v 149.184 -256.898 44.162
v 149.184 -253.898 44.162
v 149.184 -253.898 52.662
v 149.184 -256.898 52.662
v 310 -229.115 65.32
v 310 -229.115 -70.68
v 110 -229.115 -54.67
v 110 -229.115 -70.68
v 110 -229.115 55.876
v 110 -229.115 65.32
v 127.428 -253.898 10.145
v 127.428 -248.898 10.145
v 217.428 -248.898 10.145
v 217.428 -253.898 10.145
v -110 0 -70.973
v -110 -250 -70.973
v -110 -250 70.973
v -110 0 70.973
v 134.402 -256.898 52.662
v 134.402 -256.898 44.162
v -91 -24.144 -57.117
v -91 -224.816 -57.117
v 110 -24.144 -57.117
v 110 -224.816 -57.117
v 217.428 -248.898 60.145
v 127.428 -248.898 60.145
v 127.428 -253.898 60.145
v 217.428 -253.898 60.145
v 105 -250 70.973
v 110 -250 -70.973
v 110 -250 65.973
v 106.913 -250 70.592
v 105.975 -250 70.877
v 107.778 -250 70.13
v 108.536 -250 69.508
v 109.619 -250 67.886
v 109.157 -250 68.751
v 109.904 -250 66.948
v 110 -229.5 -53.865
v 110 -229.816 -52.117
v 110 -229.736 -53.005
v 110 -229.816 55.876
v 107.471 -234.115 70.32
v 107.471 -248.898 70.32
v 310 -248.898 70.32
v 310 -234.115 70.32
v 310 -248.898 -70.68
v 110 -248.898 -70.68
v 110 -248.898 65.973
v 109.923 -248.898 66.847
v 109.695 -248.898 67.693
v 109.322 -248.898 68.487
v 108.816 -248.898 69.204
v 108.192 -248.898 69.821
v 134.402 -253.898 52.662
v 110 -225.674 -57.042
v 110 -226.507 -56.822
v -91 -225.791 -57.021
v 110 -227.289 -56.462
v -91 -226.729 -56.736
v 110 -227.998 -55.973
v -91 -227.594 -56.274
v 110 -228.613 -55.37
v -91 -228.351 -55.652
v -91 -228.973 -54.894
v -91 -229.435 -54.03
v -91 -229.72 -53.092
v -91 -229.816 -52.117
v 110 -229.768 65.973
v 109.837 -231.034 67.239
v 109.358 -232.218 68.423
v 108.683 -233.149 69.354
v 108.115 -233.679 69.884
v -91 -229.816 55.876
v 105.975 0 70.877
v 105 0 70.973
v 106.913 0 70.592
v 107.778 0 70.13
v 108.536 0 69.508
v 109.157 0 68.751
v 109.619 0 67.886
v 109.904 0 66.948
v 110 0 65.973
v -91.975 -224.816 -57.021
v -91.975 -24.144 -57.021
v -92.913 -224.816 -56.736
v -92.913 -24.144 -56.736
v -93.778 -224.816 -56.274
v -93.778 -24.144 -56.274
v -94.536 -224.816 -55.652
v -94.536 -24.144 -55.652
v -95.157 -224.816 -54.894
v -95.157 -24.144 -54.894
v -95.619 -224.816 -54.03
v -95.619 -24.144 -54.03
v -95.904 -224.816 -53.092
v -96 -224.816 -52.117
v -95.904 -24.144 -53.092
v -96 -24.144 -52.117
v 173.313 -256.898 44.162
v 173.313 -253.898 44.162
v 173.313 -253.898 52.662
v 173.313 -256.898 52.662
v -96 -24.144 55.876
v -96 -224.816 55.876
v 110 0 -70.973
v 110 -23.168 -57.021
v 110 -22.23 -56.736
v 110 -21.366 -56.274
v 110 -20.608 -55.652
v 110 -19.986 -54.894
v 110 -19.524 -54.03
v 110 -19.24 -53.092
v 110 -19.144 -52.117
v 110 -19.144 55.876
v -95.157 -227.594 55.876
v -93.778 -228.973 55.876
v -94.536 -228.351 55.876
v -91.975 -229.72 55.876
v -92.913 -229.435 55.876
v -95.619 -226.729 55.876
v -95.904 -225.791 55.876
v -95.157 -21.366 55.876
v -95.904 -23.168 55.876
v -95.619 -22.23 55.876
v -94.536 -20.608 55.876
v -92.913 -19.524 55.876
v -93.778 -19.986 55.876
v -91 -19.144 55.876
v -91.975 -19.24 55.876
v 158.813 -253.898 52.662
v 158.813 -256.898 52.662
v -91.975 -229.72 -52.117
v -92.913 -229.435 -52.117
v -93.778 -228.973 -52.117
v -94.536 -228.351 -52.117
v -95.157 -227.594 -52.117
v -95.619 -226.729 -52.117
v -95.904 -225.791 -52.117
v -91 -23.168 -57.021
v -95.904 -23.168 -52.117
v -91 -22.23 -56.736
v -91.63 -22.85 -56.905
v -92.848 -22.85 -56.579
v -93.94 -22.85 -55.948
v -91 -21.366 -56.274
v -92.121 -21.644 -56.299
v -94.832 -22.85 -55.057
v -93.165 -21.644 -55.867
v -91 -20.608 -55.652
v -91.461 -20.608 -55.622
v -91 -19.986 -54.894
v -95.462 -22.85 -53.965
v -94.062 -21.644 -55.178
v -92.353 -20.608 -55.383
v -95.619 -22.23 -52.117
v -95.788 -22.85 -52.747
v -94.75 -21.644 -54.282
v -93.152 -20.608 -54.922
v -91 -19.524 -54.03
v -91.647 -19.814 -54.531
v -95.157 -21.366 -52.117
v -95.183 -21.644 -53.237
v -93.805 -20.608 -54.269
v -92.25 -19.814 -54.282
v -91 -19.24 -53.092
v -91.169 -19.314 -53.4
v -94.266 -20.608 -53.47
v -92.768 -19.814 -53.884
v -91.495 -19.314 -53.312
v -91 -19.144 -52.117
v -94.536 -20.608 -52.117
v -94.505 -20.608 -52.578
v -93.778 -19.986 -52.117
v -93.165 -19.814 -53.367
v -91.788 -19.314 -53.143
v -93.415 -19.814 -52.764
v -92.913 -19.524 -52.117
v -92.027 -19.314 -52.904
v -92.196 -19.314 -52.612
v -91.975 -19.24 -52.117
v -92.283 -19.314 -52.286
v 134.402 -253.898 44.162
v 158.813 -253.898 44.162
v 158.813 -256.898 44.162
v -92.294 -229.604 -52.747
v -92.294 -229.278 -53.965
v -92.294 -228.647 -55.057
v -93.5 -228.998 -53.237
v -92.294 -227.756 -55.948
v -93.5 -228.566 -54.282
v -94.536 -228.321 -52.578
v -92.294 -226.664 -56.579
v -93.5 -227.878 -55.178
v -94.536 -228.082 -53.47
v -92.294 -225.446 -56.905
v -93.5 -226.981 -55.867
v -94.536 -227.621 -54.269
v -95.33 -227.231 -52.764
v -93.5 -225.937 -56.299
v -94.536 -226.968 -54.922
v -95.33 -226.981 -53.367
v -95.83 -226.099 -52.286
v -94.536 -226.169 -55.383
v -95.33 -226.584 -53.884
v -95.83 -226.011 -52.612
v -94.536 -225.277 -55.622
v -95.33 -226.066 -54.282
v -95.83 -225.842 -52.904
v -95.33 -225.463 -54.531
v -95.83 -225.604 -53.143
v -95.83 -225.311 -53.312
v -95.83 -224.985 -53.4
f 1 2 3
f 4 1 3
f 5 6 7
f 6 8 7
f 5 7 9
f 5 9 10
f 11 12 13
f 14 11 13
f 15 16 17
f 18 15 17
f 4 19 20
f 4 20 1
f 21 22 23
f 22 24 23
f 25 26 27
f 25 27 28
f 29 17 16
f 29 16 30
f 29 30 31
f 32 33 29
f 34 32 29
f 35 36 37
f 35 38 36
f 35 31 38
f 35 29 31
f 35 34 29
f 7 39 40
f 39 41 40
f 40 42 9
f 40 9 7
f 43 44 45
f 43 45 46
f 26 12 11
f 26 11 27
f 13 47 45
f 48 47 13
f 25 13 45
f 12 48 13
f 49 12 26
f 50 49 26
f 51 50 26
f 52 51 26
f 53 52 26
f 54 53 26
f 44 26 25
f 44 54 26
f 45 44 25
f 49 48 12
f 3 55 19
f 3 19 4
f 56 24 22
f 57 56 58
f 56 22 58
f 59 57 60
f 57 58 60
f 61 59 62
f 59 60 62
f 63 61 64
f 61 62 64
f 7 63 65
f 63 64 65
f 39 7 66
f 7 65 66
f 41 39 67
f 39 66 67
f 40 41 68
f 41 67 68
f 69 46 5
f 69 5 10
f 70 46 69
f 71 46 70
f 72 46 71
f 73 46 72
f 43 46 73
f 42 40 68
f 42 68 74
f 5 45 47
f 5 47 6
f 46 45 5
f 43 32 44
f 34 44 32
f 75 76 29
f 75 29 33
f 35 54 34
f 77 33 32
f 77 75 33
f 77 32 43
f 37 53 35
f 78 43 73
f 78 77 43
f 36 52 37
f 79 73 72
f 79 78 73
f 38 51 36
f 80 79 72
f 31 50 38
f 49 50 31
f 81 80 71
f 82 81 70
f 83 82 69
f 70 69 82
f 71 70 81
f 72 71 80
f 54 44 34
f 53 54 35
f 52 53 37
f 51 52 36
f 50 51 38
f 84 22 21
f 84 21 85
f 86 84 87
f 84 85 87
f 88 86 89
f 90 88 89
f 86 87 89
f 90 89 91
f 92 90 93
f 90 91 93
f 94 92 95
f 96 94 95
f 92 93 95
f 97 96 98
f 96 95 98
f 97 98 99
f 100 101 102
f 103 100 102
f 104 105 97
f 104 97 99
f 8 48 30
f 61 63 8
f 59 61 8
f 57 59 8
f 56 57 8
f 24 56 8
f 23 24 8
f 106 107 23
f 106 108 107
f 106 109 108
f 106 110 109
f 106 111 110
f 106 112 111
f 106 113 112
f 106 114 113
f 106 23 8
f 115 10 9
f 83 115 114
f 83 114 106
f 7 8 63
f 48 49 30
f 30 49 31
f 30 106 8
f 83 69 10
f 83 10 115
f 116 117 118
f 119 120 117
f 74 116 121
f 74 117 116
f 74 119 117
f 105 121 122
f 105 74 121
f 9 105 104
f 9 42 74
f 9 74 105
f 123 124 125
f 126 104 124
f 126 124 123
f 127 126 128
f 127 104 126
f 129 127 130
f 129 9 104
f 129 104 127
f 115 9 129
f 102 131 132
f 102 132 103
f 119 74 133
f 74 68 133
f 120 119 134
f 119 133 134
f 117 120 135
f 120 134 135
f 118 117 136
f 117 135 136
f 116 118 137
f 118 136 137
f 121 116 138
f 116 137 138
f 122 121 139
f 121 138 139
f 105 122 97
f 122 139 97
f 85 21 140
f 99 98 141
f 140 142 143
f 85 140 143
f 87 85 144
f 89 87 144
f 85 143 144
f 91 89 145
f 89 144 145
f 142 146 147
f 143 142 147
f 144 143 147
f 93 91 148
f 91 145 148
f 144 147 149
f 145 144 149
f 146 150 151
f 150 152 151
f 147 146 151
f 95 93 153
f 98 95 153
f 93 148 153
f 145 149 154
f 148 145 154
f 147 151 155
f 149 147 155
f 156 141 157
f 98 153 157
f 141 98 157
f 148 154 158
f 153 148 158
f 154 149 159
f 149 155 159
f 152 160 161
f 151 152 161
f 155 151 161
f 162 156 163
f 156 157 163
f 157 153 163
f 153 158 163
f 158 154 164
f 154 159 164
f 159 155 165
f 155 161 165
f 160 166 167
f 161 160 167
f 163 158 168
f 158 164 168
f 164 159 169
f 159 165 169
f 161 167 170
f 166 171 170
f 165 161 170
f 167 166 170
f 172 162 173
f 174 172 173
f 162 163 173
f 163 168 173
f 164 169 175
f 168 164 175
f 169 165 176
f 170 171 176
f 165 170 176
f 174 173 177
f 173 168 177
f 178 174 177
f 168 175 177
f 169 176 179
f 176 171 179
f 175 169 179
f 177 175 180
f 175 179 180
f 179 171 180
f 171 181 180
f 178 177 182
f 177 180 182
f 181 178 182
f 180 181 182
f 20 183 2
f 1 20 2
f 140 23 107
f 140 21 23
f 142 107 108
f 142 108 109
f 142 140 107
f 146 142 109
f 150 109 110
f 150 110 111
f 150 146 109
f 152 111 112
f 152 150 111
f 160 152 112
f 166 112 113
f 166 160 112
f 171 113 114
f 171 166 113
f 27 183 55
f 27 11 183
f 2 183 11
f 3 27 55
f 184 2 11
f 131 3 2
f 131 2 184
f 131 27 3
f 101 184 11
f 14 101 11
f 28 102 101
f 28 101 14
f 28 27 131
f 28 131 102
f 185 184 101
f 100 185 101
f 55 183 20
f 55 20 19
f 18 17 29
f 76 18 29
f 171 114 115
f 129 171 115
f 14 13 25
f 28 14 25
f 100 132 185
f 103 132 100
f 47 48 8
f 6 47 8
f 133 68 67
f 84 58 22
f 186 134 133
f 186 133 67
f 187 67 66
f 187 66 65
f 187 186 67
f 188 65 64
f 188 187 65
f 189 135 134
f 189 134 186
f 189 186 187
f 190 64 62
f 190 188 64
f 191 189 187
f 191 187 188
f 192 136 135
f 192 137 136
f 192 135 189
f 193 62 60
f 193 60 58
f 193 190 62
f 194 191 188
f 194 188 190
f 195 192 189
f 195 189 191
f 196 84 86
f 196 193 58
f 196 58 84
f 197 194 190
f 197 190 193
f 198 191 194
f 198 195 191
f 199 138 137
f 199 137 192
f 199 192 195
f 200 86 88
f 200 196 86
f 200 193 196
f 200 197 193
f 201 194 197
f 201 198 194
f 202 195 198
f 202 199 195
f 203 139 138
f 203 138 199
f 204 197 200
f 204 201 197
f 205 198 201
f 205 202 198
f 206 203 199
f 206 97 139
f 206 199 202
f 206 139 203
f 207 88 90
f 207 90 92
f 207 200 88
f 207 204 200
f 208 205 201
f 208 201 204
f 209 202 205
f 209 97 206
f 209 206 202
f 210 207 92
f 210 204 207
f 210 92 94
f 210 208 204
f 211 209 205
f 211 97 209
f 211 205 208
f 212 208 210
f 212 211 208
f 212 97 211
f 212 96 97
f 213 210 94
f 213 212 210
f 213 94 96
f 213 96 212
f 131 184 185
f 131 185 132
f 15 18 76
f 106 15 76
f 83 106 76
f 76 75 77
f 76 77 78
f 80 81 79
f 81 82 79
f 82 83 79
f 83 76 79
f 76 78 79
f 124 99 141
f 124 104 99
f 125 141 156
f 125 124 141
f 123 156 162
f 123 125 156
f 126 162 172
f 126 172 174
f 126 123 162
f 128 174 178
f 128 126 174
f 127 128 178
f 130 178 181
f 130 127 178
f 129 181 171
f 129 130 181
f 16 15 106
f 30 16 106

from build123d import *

# Parameters (mm, degrees)
F0_W         = 220
F0_H         = 141.9456327772
F1_DEPTH     = 250
F3_W         = 210.672037676
F3_H         = 112.9930540919
F4_DEPTH     = 206
F5_W         = 19.7831674727
F5_H         = 141
F6_DEPTH     = 200
F7_T4_DEPTH  = 275
F7_T10_DEPTH = 275
F7_T16_DEPTH = 275
F7_T23_DEPTH = 275
F7_T29_DEPTH = 275
F8_SIZE      = 5
F9_T1_DEPTH  = 218.5
F10_R        = 5
F11_R        = 5
F12_W        = 90
F12_H        = 50
F13_DEPTH    = 5
F14_W        = 14.7826219899
F14_H        = 8.5
F15_DEPTH    = 3
F16_W        = 14.5
F16_H        = 8.5
F17_DEPTH    = 3


# Not quite as in the source:
# - a fillet or chamfer that OpenCascade refuses, or shapes differently, is made with other operations: its cross-section is extruded or revolved along the edge and cut away or added


with BuildPart() as f1:
    # F0 (on Front) → F1 (new body)
    with BuildSketch(Plane.XZ):
        Rectangle(F0_W, F0_H)
    extrude(amount=F1_DEPTH)

    # F3 (on face) → F4 (cut)
    with BuildSketch(Plane.YZ.offset(110)):
        with Locations((-124.4797622785, -0.6201006472)):
            Rectangle(F3_W, F3_H)
    extrude(amount=-F4_DEPTH, mode=Mode.SUBTRACT)

    # F5 (on face) → F6 (join)
    with BuildSketch(Plane.YZ.offset(110)):
        with Locations((-239.0063405037, -0.1803636551)):
            Rectangle(F5_W, F5_H)
    extrude(amount=F6_DEPTH)

    # F7: fillet of radius 5 on 1 edges, made by hand


with BuildPart() as f7_tool2:
    # F7_s3 → F7_t4 (new body)
    with BuildSketch(Plane.XZ.offset(-12.5)):
        with BuildLine():
            ThreePointArc((105, 70.9728163886), (108.5355339059, 69.5083502945), (110, 65.9728163886))
            Line((110, 65.9728163886), (110, 70.9728163886))
            Line((110, 70.9728163886), (105, 70.9728163886))
        make_face()
    extrude(amount=F7_T4_DEPTH)

    split(bisect_by=Plane.XY.offset(70.3196363449), keep=Keep.TOP)

    split(bisect_by=Plane.XZ.offset(229.1147567674), keep=Keep.BOTTOM)


with BuildPart() as f1_1:
    add(f1.part)

    # F7_t1: cut F7_tool2
    add(f7_tool2.part, mode=Mode.SUBTRACT)


with BuildPart() as f7_tool8:
    # F7_s9 → F7_t10 (new body)
    with BuildSketch(Plane.XZ.offset(-12.5)):
        with BuildLine():
            ThreePointArc((105, 70.9728163886), (108.5355339059, 69.5083502945), (110, 65.9728163886))
            Line((110, 65.9728163886), (110, 70.9728163886))
            Line((110, 70.9728163886), (105, 70.9728163886))
        make_face()
    extrude(amount=F7_T10_DEPTH)

    split(bisect_by=Plane.XY.offset(70.3196363449), keep=Keep.BOTTOM)

    split(bisect_by=Plane.XZ.offset(229.1147567674), keep=Keep.BOTTOM)


with BuildPart() as f1_2:
    add(f1_1.part)

    # F7_t7: cut F7_tool8
    add(f7_tool8.part, mode=Mode.SUBTRACT)


with BuildPart() as f7_tool14:
    # F7_s15 → F7_t16 (new body)
    with BuildSketch(Plane.XZ.offset(-12.5)):
        with BuildLine():
            ThreePointArc((105, 70.9728163886), (108.5355339059, 69.5083502945), (110, 65.9728163886))
            Line((110, 65.9728163886), (110, 70.9728163886))
            Line((110, 70.9728163886), (105, 70.9728163886))
        make_face()
    extrude(amount=F7_T16_DEPTH)

    split(bisect_by=Plane.XZ.offset(248.89792424), keep=Keep.BOTTOM)

    split(bisect_by=Plane.XY.offset(70.3196363449), keep=Keep.TOP)

    split(bisect_by=Plane.XZ.offset(229.1147567674), keep=Keep.TOP)


with BuildPart() as f1_3:
    add(f1_2.part)

    # F7_t13: cut F7_tool14
    add(f7_tool14.part, mode=Mode.SUBTRACT)


with BuildPart() as f7_tool21:
    # F7_s22 → F7_t23 (new body)
    with BuildSketch(Plane.XZ.offset(-12.5)):
        with BuildLine():
            ThreePointArc((105, 70.9728163886), (108.5355339059, 69.5083502945), (110, 65.9728163886))
            Line((110, 65.9728163886), (110, 70.9728163886))
            Line((110, 70.9728163886), (105, 70.9728163886))
        make_face()
    extrude(amount=F7_T23_DEPTH)

    split(bisect_by=Plane.XZ.offset(248.89792424), keep=Keep.TOP)

    split(bisect_by=Plane.XY.offset(70.3196363449), keep=Keep.TOP)


with BuildPart() as f1_4:
    add(f1_3.part)

    # F7_t20: cut F7_tool21
    add(f7_tool21.part, mode=Mode.SUBTRACT)


with BuildPart() as f7_tool27:
    # F7_s28 → F7_t29 (new body)
    with BuildSketch(Plane.XZ.offset(-12.5)):
        with BuildLine():
            ThreePointArc((105, 70.9728163886), (108.5355339059, 69.5083502945), (110, 65.9728163886))
            Line((110, 65.9728163886), (110, 70.9728163886))
            Line((110, 70.9728163886), (105, 70.9728163886))
        make_face()
    extrude(amount=F7_T29_DEPTH)

    split(bisect_by=Plane.XZ.offset(248.89792424), keep=Keep.TOP)

    split(bisect_by=Plane.XY.offset(70.3196363449), keep=Keep.BOTTOM)


with BuildPart() as f1_5:
    add(f1_4.part)

    # F7_t26: cut F7_tool27
    add(f7_tool27.part, mode=Mode.SUBTRACT)

    # F8
    f8_edges = [f1_5.edges().sort_by_distance(p)[0] for p in [
        (208.735431, -229.114757, 70.319636),
    ]]
    chamfer(f8_edges, length=F8_SIZE)

    # F9: fillet of radius 5 on 1 edges, made by hand

    # F9_s2 → F9_t1 (join)
    with BuildSketch(Plane.YZ.offset(-108.5)):
        with BuildLine():
            ThreePointArc((-224.8157811165, -57.1166276932), (-228.3513150224, -55.6521615991), (-229.8157811165, -52.1166276932))
            Line((-229.8157811165, -52.1166276932), (-229.8157811165, -57.1166276932))
            Line((-229.8157811165, -57.1166276932), (-224.8157811165, -57.1166276932))
        make_face()
    extrude(amount=F9_T1_DEPTH)

    # F10
    f10_edges = [f1_5.edges().sort_by_distance(p)[0] for p in [
        (-96, -121.979762, -57.116628),
    ]]
    fillet(f10_edges, radius=F10_R)

    # F11
    f11_edges = [f1_5.edges().sort_by_distance(p)[0] for p in [
        (9.5, -19.143743, -57.116628),
    ]]
    fillet(f11_edges, radius=F11_R)

    # F12 (on face) → F13 (join)
    with BuildSketch(Plane.XZ.offset(248.89792424)):
        with Locations((172.4283844233, 35.1449831093)):
            Rectangle(F12_W, F12_H)
    extrude(amount=F13_DEPTH)

    # F14 (on face) → F15 (join)
    with BuildSketch(Plane.XZ.offset(253.89792424)):
        with Locations((141.7928859591, 48.4116636217)):
            Rectangle(F14_W, F14_H)
    extrude(amount=F15_DEPTH)

    # F16 (on face) → F17 (join)
    with BuildSketch(Plane.XZ.offset(253.89792424)):
        with Locations((166.0626122952, 48.4116636217)):
            Rectangle(F16_W, F16_H)
    extrude(amount=F17_DEPTH)


solid = f1_5.part
